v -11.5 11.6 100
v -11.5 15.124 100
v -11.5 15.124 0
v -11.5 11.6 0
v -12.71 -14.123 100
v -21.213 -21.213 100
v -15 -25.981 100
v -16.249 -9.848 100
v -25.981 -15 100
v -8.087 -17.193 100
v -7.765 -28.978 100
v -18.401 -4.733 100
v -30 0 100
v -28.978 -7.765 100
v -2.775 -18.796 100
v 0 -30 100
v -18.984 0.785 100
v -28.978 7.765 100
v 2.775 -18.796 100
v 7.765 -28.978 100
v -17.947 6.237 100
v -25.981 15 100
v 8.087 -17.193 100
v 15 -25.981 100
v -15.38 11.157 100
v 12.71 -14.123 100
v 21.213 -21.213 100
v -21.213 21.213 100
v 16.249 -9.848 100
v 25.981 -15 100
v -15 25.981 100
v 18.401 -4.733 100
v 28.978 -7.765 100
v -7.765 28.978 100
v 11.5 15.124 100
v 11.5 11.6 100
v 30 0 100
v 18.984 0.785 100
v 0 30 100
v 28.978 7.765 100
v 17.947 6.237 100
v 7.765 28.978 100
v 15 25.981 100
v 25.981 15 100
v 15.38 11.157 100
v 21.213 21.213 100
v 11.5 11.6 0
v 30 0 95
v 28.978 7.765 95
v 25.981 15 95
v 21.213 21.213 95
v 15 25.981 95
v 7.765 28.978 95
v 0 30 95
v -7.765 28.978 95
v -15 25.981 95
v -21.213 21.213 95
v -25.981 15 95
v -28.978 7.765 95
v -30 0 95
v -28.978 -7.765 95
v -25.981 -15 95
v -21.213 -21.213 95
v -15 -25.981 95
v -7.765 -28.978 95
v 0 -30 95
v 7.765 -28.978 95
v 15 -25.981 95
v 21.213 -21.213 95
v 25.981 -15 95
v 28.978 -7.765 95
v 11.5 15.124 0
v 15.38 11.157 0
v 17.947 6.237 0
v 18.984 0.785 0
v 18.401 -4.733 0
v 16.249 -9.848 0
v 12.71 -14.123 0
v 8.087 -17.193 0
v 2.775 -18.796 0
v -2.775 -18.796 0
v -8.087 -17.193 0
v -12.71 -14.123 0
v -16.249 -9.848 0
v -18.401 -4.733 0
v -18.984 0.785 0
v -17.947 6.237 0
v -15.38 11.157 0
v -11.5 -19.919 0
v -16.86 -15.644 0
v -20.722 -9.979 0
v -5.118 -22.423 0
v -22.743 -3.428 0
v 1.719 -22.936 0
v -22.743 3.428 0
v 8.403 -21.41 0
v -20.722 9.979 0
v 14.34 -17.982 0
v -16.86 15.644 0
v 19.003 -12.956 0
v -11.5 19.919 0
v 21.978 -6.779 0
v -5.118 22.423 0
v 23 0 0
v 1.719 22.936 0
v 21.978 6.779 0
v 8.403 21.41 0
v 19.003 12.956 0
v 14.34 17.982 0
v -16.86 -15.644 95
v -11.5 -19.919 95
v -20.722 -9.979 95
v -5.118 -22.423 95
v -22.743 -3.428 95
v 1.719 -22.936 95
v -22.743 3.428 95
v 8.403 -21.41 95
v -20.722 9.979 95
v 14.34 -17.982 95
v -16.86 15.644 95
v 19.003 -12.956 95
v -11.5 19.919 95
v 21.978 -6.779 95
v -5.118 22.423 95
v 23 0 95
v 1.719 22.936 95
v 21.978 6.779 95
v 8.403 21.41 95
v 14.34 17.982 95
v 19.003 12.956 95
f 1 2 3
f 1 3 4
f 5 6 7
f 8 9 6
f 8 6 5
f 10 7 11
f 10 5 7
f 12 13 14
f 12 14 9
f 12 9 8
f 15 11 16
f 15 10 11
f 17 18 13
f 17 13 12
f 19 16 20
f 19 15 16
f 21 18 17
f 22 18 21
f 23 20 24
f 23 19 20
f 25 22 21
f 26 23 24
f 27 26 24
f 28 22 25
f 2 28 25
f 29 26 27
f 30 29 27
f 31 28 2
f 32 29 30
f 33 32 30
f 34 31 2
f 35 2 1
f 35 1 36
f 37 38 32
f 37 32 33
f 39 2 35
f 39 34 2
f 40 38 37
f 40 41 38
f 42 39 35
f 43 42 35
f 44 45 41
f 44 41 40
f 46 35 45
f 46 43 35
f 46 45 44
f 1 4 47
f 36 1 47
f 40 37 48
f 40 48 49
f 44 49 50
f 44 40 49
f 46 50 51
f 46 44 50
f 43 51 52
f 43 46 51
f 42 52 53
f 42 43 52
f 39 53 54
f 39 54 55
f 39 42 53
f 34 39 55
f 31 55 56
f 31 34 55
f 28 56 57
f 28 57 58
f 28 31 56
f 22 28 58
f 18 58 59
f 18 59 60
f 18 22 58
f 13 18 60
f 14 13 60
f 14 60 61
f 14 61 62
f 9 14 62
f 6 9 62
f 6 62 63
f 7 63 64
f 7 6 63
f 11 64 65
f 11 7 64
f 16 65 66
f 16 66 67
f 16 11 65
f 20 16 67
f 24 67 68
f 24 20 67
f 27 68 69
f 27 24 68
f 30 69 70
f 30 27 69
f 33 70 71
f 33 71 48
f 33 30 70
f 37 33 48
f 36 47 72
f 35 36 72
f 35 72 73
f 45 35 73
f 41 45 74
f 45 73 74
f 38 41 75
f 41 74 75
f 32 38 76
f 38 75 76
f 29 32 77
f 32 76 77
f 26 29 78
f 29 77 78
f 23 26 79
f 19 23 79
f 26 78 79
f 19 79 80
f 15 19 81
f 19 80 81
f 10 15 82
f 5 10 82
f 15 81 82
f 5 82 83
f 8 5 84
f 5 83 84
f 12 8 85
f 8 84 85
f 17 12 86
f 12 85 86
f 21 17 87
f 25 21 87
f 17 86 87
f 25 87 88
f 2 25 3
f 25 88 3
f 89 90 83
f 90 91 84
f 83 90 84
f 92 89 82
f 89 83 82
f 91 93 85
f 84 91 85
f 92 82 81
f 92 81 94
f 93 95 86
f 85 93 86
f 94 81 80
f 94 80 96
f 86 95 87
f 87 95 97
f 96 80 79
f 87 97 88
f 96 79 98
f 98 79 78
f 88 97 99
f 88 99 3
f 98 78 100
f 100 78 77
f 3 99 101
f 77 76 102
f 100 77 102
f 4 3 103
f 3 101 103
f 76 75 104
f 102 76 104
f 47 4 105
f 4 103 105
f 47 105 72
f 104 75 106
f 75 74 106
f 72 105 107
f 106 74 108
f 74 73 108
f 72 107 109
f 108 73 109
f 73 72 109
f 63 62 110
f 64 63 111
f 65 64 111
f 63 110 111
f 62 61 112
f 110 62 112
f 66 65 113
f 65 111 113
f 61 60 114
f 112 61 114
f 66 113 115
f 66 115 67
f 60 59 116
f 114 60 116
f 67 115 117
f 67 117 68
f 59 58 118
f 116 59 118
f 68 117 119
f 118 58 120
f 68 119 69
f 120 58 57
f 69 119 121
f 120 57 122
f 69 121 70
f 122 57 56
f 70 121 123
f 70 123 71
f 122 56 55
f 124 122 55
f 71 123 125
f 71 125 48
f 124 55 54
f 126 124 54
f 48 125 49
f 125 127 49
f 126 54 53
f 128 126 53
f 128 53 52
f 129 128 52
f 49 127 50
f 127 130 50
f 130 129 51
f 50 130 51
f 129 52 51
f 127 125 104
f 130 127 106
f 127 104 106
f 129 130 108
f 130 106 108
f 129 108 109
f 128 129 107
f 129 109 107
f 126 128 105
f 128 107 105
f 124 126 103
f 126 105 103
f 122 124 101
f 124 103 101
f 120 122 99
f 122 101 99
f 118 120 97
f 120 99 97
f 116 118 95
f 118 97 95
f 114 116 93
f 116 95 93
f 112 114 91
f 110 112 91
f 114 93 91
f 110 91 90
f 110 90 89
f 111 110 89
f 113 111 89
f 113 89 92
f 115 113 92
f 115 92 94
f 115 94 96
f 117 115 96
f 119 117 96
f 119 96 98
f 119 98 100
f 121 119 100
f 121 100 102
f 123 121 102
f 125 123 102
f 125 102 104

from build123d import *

# Parameters (mm, degrees)
F0_R     = 23
F1_DEPTH = 100
F2_R     = 30
F2_R_2   = 23
F3_DEPTH = 5


with BuildPart() as f1:
    # F0 (on Top) → F1 (new body)
    with BuildSketch(Plane.XY):
        Circle(F0_R)
        with BuildLine():
            ThreePointArc((11.5, 15.124483), (0, -19), (-11.5, 15.124483))
            Line((-11.5, 15.124483), (-11.5, 11.6))
            Line((-11.5, 11.6), (11.5, 11.6))
            Line((11.5, 11.6), (11.5, 15.124483))
        make_face(mode=Mode.SUBTRACT)
    extrude(amount=F1_DEPTH)

    # F2 (on face) → F3 (join)
    with BuildSketch(Plane.XY.offset(100)):
        Circle(F2_R)
        Circle(F2_R_2, mode=Mode.SUBTRACT)
    extrude(amount=-F3_DEPTH)


solid = f1.part
